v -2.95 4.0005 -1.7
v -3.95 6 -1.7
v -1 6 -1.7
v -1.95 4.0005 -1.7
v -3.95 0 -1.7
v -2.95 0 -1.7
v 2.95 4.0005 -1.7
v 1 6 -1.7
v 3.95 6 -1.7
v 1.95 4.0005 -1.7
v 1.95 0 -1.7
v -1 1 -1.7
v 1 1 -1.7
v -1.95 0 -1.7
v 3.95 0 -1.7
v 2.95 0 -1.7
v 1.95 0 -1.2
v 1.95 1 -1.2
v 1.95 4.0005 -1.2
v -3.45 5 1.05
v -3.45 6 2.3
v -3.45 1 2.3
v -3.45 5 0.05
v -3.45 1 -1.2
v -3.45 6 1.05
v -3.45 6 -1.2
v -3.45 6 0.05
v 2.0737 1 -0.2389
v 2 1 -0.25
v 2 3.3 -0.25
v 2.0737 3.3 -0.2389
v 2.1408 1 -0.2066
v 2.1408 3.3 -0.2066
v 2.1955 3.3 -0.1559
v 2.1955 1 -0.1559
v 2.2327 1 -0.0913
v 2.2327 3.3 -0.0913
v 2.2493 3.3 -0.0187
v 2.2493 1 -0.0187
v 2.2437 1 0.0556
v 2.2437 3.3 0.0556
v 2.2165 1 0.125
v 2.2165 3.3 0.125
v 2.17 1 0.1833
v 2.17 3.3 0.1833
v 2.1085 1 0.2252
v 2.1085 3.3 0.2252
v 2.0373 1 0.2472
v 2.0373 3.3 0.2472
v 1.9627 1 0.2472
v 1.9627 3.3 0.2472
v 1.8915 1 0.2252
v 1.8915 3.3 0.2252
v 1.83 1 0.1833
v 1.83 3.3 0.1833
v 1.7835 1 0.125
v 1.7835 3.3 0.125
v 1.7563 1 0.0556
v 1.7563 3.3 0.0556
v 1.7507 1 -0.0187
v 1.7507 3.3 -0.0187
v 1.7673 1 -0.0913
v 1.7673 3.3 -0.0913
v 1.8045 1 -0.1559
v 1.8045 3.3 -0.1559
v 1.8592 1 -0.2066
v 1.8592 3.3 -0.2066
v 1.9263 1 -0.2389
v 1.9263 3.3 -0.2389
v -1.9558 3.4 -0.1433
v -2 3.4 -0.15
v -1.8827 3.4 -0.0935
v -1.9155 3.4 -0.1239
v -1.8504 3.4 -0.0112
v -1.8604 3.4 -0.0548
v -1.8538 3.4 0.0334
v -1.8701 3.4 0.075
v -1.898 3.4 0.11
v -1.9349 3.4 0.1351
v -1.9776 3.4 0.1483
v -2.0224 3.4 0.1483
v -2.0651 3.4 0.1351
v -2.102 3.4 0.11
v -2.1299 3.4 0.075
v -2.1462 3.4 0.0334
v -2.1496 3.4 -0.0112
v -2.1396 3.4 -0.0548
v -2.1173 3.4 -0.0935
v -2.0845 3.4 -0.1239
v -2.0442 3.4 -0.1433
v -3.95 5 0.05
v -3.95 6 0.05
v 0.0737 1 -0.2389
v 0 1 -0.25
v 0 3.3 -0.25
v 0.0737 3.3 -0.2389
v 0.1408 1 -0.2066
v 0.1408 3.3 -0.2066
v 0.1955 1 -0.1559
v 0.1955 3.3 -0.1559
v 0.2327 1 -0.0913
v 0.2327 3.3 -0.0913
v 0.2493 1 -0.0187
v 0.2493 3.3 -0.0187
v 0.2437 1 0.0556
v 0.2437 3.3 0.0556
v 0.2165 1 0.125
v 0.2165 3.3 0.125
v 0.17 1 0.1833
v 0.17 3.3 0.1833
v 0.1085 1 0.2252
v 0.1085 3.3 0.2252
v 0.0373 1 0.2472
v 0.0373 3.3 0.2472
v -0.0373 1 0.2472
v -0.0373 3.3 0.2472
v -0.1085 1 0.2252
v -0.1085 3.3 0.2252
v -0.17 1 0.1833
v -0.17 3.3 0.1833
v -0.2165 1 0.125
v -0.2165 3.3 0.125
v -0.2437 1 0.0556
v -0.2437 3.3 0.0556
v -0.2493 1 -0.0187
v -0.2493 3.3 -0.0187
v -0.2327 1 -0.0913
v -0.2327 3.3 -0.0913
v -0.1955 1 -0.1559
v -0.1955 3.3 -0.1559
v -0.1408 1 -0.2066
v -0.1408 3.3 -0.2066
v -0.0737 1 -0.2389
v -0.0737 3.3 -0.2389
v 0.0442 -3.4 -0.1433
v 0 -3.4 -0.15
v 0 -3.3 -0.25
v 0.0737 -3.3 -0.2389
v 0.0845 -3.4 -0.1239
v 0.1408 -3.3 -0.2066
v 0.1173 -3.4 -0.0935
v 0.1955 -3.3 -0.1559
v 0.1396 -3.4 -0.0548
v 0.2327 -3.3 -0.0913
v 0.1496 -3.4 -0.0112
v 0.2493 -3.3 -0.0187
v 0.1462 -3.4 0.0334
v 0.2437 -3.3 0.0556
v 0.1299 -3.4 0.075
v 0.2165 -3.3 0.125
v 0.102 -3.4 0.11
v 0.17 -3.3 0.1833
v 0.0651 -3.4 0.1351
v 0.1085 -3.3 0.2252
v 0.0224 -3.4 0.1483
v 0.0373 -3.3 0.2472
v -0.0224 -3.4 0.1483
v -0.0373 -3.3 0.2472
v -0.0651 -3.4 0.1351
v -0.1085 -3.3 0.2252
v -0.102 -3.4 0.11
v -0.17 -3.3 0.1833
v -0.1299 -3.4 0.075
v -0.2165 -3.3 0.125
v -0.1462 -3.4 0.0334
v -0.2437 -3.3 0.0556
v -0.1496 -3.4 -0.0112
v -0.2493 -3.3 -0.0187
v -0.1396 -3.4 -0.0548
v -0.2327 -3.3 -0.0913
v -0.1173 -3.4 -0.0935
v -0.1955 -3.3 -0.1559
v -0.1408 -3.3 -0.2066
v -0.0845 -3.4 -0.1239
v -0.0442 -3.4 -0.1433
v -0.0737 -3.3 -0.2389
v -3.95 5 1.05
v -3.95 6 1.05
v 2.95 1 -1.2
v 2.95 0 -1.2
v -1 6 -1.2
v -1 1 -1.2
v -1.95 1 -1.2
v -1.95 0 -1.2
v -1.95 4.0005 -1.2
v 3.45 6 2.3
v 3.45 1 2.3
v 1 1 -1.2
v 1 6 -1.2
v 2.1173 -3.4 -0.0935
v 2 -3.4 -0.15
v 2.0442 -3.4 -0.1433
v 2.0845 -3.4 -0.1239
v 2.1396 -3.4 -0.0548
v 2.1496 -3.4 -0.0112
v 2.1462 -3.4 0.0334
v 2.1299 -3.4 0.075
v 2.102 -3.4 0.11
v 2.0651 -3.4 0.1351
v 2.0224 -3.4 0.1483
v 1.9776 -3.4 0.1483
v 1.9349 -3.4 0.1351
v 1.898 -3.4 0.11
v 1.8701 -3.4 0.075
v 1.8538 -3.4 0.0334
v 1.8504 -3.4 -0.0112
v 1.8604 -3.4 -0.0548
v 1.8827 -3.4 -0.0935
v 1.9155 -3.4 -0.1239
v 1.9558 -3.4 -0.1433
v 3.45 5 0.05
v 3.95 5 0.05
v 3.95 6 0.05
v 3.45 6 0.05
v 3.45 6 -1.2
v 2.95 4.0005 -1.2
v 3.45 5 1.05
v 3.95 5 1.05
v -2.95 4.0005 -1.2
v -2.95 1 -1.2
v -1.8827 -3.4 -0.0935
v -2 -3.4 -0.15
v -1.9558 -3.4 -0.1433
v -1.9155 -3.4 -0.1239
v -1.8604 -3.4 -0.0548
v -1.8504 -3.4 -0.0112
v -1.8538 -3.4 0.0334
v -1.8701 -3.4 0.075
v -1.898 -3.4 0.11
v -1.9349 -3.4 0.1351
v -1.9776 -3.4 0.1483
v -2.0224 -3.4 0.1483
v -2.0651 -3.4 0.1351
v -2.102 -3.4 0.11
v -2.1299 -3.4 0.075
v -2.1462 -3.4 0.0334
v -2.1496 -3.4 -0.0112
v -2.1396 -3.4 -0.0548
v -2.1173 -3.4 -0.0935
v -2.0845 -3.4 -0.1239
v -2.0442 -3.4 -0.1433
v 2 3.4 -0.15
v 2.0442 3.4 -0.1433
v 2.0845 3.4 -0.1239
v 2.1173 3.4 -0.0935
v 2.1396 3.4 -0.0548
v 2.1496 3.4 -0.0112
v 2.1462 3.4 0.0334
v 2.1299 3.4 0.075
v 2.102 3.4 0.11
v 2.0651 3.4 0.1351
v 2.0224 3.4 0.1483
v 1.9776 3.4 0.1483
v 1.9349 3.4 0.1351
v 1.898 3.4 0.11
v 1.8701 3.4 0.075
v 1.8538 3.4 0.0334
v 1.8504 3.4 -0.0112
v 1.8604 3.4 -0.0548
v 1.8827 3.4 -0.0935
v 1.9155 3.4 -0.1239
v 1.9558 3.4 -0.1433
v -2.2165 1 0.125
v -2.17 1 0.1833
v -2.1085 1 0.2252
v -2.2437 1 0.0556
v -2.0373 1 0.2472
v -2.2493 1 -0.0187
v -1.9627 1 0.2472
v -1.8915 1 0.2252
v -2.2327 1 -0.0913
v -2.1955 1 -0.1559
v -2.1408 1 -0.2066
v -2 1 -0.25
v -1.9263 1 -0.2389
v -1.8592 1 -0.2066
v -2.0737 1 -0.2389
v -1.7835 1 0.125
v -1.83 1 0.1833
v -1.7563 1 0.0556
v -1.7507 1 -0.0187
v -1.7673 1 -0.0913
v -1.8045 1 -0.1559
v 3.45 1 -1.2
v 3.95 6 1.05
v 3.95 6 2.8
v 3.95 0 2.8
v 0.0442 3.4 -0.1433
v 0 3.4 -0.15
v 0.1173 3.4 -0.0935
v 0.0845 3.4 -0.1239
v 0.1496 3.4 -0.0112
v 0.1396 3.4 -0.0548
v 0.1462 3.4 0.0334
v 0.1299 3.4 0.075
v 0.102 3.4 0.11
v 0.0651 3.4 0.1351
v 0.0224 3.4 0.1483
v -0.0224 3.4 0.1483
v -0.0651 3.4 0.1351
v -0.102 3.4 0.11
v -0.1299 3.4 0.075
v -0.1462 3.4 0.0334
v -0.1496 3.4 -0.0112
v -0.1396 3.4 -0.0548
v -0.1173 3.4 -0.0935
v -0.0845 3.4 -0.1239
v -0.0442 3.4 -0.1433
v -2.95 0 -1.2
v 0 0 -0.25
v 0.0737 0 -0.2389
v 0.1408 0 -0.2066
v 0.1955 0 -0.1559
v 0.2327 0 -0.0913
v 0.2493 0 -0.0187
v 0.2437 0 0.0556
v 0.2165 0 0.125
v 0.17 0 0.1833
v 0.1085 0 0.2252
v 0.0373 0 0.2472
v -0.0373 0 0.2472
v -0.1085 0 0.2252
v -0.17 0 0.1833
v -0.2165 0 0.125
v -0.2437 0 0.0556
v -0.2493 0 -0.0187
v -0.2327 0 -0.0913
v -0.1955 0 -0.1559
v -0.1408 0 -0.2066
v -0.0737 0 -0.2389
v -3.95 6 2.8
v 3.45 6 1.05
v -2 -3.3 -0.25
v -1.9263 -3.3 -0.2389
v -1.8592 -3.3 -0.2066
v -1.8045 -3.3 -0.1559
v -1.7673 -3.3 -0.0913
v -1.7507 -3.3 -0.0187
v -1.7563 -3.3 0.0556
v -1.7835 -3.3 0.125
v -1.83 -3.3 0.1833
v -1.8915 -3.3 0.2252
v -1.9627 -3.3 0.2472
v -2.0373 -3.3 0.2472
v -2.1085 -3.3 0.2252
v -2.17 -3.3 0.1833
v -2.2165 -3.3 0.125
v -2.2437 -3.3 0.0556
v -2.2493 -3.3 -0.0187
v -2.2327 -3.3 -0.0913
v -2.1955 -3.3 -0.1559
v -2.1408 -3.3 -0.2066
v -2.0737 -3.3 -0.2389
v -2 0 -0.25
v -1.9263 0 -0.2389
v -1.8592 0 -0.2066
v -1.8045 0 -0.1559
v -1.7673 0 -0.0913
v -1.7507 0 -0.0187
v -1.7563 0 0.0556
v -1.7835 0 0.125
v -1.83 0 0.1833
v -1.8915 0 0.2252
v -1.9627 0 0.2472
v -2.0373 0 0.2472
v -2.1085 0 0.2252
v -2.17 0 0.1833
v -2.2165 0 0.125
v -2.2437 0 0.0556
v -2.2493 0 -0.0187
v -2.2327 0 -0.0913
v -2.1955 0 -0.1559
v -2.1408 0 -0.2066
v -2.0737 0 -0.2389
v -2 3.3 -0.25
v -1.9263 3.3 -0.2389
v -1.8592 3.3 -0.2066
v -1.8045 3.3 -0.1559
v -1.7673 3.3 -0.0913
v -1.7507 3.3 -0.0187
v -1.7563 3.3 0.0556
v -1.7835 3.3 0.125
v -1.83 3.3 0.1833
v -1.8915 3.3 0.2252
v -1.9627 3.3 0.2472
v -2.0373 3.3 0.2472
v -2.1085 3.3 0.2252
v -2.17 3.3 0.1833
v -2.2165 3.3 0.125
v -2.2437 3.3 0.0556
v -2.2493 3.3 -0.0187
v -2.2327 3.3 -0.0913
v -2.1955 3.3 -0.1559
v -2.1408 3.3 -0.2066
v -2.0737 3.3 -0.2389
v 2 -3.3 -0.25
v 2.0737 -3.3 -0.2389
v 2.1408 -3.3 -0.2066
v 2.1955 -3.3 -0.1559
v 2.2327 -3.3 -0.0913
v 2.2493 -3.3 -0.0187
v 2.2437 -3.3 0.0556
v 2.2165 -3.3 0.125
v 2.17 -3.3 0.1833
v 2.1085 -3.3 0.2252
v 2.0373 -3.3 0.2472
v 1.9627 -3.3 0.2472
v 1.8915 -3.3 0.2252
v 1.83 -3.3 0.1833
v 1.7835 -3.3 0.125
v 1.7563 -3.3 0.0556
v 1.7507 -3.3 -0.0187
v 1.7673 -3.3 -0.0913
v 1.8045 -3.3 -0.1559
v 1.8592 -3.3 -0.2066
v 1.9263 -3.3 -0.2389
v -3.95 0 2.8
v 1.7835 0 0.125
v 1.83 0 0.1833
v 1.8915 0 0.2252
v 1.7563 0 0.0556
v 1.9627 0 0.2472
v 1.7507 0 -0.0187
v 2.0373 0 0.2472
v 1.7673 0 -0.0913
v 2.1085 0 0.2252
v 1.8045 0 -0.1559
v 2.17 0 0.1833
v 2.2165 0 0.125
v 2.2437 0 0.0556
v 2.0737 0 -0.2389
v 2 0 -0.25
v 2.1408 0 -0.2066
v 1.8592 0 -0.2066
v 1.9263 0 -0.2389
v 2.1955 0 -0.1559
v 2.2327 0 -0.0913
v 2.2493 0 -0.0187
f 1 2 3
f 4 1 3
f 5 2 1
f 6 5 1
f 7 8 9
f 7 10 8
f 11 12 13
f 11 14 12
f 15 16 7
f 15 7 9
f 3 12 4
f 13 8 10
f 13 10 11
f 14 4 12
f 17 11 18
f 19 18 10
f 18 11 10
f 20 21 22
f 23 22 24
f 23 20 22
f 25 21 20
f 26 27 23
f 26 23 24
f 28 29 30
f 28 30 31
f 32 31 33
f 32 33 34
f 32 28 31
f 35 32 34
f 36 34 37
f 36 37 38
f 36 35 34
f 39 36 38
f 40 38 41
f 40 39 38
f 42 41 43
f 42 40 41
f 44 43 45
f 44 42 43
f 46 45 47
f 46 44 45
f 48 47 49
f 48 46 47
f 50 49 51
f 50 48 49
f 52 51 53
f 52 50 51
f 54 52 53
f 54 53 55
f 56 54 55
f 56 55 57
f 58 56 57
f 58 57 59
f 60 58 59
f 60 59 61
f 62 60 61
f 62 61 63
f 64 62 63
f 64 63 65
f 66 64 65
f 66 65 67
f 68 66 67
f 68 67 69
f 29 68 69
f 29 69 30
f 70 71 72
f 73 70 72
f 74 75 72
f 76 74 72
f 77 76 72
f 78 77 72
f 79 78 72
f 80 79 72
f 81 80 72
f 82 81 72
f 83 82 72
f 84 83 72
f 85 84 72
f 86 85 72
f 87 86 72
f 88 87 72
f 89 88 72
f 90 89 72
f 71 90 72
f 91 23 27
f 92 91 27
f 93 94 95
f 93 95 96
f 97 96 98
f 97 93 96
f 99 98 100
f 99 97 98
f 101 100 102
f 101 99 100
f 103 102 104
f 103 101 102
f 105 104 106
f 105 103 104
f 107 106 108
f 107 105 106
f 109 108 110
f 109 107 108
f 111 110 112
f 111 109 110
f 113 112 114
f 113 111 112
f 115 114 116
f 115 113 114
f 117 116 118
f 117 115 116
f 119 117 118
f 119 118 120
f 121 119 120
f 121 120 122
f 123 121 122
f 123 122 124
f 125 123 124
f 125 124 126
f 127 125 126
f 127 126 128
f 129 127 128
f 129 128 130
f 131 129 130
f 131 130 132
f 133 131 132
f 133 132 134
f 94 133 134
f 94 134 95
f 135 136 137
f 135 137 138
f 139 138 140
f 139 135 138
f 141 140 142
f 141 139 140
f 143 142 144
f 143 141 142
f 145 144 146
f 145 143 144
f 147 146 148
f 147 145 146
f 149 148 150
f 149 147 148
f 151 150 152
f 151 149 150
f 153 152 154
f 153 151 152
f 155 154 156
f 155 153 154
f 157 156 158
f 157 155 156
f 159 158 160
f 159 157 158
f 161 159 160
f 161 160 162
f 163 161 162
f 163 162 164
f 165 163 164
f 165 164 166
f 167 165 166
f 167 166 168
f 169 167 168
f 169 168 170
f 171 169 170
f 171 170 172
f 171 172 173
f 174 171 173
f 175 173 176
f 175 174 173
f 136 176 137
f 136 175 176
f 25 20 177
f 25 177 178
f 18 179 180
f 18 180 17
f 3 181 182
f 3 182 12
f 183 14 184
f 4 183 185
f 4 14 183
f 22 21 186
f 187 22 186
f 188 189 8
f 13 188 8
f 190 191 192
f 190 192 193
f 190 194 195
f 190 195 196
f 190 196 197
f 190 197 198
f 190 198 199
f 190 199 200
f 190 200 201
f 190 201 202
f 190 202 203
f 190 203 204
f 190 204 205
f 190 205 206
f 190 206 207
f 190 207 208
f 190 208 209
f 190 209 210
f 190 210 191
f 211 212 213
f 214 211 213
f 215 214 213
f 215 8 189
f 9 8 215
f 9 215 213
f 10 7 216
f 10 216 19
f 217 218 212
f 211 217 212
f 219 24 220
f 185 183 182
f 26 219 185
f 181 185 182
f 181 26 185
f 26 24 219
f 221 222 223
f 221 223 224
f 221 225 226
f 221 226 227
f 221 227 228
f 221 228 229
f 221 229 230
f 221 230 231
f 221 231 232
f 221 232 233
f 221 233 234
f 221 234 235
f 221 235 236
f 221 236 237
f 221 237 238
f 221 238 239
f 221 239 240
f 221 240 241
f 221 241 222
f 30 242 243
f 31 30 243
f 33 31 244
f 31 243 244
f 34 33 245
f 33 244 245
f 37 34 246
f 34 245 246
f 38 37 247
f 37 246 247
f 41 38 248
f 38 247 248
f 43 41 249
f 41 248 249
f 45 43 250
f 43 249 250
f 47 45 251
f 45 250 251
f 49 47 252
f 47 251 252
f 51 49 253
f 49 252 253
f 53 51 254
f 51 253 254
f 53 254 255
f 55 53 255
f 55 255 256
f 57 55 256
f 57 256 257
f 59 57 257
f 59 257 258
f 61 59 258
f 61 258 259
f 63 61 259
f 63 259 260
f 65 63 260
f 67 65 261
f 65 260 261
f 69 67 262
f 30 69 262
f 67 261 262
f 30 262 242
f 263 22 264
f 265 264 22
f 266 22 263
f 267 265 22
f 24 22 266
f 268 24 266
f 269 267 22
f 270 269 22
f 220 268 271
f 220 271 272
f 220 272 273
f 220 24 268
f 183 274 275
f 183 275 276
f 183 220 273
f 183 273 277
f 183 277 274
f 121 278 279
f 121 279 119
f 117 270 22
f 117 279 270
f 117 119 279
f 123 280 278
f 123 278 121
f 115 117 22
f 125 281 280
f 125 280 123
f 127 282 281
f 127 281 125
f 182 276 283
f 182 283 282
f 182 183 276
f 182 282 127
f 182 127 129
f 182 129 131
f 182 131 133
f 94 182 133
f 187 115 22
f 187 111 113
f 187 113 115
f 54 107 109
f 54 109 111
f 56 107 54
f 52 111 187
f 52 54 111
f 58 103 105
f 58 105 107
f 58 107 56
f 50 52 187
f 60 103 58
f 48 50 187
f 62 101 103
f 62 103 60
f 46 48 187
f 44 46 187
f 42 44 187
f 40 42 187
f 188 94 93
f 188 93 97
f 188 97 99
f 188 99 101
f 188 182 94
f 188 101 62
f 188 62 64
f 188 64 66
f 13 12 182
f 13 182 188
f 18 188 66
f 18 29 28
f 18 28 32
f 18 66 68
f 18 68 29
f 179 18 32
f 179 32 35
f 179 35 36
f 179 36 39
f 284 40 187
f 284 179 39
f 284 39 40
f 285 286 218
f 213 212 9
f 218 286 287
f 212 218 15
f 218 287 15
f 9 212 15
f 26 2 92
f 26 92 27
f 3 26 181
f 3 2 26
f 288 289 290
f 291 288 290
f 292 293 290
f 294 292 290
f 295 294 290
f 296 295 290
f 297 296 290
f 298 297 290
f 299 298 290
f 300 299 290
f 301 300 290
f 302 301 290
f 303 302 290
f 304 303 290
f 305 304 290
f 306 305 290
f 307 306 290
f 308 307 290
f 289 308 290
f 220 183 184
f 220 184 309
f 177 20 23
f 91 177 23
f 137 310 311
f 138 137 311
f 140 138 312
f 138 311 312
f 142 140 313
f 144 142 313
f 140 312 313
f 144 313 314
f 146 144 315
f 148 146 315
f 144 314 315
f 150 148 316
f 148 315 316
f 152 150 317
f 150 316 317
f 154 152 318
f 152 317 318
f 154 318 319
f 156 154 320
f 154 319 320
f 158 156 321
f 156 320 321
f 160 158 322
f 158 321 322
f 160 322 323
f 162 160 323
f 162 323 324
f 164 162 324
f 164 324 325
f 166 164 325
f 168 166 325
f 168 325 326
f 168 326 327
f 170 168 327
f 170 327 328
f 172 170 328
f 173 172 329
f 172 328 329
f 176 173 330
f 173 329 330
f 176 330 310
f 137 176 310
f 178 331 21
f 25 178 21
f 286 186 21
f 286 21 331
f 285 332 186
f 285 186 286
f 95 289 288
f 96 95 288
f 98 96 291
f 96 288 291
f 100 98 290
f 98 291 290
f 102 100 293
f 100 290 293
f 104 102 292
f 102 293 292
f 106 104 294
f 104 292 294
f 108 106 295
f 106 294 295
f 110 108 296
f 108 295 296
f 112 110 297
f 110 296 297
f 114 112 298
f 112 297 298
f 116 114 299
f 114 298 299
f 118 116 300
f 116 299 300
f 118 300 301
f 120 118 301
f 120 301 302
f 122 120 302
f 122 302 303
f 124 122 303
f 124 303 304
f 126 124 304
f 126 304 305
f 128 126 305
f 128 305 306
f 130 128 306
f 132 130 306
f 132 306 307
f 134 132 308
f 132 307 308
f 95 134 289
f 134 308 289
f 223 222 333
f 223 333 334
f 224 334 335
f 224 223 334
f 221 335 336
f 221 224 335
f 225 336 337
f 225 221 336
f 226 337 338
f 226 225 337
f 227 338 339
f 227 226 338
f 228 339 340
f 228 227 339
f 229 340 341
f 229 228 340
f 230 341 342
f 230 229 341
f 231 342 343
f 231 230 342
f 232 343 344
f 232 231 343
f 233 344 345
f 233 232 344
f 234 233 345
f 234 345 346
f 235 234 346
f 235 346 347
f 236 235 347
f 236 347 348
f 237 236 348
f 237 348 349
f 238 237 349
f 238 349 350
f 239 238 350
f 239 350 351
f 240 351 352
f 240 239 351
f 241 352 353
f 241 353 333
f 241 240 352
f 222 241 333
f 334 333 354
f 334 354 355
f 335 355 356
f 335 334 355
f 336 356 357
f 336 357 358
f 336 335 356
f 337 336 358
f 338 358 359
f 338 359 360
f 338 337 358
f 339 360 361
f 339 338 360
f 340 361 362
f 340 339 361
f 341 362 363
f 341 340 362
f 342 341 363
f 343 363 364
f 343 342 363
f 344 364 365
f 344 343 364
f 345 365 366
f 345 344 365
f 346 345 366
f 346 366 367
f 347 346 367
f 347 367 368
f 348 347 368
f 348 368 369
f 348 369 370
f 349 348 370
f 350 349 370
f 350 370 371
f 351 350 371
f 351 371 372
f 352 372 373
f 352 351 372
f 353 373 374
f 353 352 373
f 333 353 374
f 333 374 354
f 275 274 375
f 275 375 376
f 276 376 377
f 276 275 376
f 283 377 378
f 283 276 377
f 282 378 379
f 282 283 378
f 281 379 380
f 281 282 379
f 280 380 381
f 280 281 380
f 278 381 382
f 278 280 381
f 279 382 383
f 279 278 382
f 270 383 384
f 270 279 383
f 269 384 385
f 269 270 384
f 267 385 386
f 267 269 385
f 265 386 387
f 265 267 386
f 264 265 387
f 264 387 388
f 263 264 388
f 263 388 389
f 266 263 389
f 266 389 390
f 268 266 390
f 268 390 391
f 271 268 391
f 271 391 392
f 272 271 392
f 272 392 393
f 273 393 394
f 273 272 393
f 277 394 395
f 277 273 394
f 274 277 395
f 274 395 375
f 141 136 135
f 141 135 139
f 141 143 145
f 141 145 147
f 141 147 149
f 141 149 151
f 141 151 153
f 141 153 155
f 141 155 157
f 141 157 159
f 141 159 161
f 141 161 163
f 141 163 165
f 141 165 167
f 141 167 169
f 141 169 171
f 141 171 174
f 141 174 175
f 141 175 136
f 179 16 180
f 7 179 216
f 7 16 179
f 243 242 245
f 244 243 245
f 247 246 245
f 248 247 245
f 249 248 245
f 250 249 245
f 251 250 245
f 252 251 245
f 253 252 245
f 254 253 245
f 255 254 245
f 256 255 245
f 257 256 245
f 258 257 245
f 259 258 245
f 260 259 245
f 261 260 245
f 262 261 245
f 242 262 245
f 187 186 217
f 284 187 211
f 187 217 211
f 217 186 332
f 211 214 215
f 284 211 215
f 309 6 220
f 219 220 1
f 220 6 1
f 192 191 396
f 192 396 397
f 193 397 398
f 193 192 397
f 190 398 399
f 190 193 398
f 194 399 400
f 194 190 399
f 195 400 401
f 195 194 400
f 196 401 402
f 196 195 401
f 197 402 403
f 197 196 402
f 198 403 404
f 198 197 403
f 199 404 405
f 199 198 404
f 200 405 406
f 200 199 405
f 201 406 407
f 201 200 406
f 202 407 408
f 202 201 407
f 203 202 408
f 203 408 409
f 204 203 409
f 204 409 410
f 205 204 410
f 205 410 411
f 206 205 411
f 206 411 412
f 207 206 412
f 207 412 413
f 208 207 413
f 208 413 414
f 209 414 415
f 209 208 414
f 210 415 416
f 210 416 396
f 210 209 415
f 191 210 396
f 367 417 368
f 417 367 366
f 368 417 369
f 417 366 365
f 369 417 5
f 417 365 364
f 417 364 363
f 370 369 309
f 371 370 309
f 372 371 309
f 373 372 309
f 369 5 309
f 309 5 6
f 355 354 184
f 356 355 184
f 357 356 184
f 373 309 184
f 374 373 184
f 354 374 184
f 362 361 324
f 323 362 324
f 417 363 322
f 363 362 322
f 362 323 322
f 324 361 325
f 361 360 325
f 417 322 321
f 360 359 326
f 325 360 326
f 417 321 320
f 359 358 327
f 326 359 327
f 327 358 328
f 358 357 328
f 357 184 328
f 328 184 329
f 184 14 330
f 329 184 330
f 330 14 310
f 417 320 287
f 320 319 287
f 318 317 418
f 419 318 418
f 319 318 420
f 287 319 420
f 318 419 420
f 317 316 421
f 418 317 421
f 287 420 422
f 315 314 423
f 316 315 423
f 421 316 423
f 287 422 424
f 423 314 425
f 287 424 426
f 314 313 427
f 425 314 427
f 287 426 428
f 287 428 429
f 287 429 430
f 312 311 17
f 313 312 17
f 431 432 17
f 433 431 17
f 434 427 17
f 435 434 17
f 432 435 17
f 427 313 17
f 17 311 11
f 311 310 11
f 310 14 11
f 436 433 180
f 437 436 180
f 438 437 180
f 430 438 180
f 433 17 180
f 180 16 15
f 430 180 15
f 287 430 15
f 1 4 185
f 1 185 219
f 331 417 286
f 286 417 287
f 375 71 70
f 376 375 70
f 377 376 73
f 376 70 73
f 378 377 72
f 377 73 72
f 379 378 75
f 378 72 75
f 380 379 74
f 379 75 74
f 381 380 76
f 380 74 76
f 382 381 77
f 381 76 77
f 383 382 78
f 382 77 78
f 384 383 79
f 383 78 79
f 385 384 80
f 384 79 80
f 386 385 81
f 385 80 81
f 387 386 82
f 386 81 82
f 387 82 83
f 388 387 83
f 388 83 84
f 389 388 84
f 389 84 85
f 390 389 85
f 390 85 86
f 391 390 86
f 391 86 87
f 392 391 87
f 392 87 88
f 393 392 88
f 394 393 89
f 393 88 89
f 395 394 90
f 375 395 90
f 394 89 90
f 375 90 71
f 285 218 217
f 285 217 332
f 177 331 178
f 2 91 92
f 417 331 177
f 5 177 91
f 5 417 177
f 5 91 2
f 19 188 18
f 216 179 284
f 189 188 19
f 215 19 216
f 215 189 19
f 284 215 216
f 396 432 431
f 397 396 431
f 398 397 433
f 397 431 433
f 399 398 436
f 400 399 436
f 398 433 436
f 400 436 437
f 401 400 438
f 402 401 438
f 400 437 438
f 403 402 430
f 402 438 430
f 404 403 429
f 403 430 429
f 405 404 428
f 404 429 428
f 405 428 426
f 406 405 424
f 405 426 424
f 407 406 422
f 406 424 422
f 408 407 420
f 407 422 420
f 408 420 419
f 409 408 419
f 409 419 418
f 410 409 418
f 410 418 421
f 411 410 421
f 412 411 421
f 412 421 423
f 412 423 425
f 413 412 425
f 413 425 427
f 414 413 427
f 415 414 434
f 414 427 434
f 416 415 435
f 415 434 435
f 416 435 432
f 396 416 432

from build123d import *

# Parameters (mm, degrees)
CROQUIS1_W              = 7.9
CROQUIS1_H              = 4.5
SALIENTE_EXTRUIR2_DEPTH = 6
CROQUIS4_W              = 6.9
CROQUIS4_H              = 3.5
CORTAR_EXTRUIR2_DEPTH   = 5
CROQUIS5_R              = 0.25
SALIENTE_EXTRUIR3_DEPTH = 3.4
CROQUIS6_W              = 2
CROQUIS6_H              = 0.5
CORTAR_EXTRUIR3_DEPTH   = 5
CROQUIS7_W              = 1
CROQUIS7_H              = 1
CORTAR_EXTRUIR5_DEPTH   = 8
CROQUIS8_W              = 1
CROQUIS8_H              = 4.000523864
CORTAR_EXTRUIR7_DEPTH   = 0.5
CHAFL_N3_SIZE           = 0.1


with BuildPart() as part:
    # Croquis1 → Saliente-Extruir2 (new body)
    with BuildSketch(Plane(origin=(0, 0, 0), x_dir=(1, 0, 0), z_dir=(0, 1, 0))):
        with Locations((0, -0.55)):
            Rectangle(CROQUIS1_W, CROQUIS1_H)
    extrude(amount=SALIENTE_EXTRUIR2_DEPTH)

    # Croquis4 → Cortar-Extruir2 (cut)
    with BuildSketch(Plane(origin=(0, 6, 0), x_dir=(1, 0, 0), z_dir=(0, 1, 0))):
        with Locations((0, -0.55)):
            Rectangle(CROQUIS4_W, CROQUIS4_H)
    extrude(amount=-CORTAR_EXTRUIR2_DEPTH, mode=Mode.SUBTRACT)

    # Croquis5 → Saliente-Extruir3 (add, symmetric)
    with BuildSketch(Plane(origin=(0, 0, 0), x_dir=(-1, 0, 0), z_dir=(0, -1, 0))):
        with Locations(Location((0, 0, 0), (0, 0, 90))):
            Circle(CROQUIS5_R)
        with Locations(Location((-2, 0, 0), (0, 0, 90))):
            Circle(CROQUIS5_R)
        with Locations(Location((2, 0, 0), (0, 0, 90))):
            Circle(CROQUIS5_R)
    extrude(amount=SALIENTE_EXTRUIR3_DEPTH, both=True)

    # Croquis6 → Cortar-Extruir3 (cut)
    with BuildSketch(Plane(origin=(0, 6, 0), x_dir=(1, 0, 0), z_dir=(0, 1, 0))):
        with Locations((0, 1.45)):
            Rectangle(CROQUIS6_W, CROQUIS6_H)
    extrude(amount=-CORTAR_EXTRUIR3_DEPTH, mode=Mode.SUBTRACT)

    # Croquis7 → Cortar-Extruir5 (cut)
    with BuildSketch(Plane(origin=(3.95, 0, 0), x_dir=(0, 0, -1), z_dir=(1, 0, 0))):
        with Locations((-0.55, 5.5)):
            Rectangle(CROQUIS7_W, CROQUIS7_H)
    extrude(amount=-CORTAR_EXTRUIR5_DEPTH, mode=Mode.SUBTRACT)

    # Croquis8 → Cortar-Extruir7 (cut)
    with BuildSketch(Plane(origin=(0, 0, -1.7), x_dir=(-1, 0, 0), z_dir=(0, 0, -1))):
        with Locations((-2.45, 2.000261932)):
            Rectangle(CROQUIS8_W, CROQUIS8_H)
        with Locations((2.45, 2.000261932)):
            Rectangle(CROQUIS8_W, CROQUIS8_H)
    extrude(amount=-CORTAR_EXTRUIR7_DEPTH, mode=Mode.SUBTRACT)

    # Chaflán3
    chafl_n3_edges = [part.edges().sort_by_distance(p)[0] for p in [
        (0, 3.4, 0.25),
        (0, -3.4, 0.25),
        (2, 3.4, 0.25),
        (2, -3.4, 0.25),
        (-2, 3.4, 0.25),
        (-2, -3.4, 0.25),
    ]]
    chamfer(chafl_n3_edges, length=CHAFL_N3_SIZE)


solid = part.part
